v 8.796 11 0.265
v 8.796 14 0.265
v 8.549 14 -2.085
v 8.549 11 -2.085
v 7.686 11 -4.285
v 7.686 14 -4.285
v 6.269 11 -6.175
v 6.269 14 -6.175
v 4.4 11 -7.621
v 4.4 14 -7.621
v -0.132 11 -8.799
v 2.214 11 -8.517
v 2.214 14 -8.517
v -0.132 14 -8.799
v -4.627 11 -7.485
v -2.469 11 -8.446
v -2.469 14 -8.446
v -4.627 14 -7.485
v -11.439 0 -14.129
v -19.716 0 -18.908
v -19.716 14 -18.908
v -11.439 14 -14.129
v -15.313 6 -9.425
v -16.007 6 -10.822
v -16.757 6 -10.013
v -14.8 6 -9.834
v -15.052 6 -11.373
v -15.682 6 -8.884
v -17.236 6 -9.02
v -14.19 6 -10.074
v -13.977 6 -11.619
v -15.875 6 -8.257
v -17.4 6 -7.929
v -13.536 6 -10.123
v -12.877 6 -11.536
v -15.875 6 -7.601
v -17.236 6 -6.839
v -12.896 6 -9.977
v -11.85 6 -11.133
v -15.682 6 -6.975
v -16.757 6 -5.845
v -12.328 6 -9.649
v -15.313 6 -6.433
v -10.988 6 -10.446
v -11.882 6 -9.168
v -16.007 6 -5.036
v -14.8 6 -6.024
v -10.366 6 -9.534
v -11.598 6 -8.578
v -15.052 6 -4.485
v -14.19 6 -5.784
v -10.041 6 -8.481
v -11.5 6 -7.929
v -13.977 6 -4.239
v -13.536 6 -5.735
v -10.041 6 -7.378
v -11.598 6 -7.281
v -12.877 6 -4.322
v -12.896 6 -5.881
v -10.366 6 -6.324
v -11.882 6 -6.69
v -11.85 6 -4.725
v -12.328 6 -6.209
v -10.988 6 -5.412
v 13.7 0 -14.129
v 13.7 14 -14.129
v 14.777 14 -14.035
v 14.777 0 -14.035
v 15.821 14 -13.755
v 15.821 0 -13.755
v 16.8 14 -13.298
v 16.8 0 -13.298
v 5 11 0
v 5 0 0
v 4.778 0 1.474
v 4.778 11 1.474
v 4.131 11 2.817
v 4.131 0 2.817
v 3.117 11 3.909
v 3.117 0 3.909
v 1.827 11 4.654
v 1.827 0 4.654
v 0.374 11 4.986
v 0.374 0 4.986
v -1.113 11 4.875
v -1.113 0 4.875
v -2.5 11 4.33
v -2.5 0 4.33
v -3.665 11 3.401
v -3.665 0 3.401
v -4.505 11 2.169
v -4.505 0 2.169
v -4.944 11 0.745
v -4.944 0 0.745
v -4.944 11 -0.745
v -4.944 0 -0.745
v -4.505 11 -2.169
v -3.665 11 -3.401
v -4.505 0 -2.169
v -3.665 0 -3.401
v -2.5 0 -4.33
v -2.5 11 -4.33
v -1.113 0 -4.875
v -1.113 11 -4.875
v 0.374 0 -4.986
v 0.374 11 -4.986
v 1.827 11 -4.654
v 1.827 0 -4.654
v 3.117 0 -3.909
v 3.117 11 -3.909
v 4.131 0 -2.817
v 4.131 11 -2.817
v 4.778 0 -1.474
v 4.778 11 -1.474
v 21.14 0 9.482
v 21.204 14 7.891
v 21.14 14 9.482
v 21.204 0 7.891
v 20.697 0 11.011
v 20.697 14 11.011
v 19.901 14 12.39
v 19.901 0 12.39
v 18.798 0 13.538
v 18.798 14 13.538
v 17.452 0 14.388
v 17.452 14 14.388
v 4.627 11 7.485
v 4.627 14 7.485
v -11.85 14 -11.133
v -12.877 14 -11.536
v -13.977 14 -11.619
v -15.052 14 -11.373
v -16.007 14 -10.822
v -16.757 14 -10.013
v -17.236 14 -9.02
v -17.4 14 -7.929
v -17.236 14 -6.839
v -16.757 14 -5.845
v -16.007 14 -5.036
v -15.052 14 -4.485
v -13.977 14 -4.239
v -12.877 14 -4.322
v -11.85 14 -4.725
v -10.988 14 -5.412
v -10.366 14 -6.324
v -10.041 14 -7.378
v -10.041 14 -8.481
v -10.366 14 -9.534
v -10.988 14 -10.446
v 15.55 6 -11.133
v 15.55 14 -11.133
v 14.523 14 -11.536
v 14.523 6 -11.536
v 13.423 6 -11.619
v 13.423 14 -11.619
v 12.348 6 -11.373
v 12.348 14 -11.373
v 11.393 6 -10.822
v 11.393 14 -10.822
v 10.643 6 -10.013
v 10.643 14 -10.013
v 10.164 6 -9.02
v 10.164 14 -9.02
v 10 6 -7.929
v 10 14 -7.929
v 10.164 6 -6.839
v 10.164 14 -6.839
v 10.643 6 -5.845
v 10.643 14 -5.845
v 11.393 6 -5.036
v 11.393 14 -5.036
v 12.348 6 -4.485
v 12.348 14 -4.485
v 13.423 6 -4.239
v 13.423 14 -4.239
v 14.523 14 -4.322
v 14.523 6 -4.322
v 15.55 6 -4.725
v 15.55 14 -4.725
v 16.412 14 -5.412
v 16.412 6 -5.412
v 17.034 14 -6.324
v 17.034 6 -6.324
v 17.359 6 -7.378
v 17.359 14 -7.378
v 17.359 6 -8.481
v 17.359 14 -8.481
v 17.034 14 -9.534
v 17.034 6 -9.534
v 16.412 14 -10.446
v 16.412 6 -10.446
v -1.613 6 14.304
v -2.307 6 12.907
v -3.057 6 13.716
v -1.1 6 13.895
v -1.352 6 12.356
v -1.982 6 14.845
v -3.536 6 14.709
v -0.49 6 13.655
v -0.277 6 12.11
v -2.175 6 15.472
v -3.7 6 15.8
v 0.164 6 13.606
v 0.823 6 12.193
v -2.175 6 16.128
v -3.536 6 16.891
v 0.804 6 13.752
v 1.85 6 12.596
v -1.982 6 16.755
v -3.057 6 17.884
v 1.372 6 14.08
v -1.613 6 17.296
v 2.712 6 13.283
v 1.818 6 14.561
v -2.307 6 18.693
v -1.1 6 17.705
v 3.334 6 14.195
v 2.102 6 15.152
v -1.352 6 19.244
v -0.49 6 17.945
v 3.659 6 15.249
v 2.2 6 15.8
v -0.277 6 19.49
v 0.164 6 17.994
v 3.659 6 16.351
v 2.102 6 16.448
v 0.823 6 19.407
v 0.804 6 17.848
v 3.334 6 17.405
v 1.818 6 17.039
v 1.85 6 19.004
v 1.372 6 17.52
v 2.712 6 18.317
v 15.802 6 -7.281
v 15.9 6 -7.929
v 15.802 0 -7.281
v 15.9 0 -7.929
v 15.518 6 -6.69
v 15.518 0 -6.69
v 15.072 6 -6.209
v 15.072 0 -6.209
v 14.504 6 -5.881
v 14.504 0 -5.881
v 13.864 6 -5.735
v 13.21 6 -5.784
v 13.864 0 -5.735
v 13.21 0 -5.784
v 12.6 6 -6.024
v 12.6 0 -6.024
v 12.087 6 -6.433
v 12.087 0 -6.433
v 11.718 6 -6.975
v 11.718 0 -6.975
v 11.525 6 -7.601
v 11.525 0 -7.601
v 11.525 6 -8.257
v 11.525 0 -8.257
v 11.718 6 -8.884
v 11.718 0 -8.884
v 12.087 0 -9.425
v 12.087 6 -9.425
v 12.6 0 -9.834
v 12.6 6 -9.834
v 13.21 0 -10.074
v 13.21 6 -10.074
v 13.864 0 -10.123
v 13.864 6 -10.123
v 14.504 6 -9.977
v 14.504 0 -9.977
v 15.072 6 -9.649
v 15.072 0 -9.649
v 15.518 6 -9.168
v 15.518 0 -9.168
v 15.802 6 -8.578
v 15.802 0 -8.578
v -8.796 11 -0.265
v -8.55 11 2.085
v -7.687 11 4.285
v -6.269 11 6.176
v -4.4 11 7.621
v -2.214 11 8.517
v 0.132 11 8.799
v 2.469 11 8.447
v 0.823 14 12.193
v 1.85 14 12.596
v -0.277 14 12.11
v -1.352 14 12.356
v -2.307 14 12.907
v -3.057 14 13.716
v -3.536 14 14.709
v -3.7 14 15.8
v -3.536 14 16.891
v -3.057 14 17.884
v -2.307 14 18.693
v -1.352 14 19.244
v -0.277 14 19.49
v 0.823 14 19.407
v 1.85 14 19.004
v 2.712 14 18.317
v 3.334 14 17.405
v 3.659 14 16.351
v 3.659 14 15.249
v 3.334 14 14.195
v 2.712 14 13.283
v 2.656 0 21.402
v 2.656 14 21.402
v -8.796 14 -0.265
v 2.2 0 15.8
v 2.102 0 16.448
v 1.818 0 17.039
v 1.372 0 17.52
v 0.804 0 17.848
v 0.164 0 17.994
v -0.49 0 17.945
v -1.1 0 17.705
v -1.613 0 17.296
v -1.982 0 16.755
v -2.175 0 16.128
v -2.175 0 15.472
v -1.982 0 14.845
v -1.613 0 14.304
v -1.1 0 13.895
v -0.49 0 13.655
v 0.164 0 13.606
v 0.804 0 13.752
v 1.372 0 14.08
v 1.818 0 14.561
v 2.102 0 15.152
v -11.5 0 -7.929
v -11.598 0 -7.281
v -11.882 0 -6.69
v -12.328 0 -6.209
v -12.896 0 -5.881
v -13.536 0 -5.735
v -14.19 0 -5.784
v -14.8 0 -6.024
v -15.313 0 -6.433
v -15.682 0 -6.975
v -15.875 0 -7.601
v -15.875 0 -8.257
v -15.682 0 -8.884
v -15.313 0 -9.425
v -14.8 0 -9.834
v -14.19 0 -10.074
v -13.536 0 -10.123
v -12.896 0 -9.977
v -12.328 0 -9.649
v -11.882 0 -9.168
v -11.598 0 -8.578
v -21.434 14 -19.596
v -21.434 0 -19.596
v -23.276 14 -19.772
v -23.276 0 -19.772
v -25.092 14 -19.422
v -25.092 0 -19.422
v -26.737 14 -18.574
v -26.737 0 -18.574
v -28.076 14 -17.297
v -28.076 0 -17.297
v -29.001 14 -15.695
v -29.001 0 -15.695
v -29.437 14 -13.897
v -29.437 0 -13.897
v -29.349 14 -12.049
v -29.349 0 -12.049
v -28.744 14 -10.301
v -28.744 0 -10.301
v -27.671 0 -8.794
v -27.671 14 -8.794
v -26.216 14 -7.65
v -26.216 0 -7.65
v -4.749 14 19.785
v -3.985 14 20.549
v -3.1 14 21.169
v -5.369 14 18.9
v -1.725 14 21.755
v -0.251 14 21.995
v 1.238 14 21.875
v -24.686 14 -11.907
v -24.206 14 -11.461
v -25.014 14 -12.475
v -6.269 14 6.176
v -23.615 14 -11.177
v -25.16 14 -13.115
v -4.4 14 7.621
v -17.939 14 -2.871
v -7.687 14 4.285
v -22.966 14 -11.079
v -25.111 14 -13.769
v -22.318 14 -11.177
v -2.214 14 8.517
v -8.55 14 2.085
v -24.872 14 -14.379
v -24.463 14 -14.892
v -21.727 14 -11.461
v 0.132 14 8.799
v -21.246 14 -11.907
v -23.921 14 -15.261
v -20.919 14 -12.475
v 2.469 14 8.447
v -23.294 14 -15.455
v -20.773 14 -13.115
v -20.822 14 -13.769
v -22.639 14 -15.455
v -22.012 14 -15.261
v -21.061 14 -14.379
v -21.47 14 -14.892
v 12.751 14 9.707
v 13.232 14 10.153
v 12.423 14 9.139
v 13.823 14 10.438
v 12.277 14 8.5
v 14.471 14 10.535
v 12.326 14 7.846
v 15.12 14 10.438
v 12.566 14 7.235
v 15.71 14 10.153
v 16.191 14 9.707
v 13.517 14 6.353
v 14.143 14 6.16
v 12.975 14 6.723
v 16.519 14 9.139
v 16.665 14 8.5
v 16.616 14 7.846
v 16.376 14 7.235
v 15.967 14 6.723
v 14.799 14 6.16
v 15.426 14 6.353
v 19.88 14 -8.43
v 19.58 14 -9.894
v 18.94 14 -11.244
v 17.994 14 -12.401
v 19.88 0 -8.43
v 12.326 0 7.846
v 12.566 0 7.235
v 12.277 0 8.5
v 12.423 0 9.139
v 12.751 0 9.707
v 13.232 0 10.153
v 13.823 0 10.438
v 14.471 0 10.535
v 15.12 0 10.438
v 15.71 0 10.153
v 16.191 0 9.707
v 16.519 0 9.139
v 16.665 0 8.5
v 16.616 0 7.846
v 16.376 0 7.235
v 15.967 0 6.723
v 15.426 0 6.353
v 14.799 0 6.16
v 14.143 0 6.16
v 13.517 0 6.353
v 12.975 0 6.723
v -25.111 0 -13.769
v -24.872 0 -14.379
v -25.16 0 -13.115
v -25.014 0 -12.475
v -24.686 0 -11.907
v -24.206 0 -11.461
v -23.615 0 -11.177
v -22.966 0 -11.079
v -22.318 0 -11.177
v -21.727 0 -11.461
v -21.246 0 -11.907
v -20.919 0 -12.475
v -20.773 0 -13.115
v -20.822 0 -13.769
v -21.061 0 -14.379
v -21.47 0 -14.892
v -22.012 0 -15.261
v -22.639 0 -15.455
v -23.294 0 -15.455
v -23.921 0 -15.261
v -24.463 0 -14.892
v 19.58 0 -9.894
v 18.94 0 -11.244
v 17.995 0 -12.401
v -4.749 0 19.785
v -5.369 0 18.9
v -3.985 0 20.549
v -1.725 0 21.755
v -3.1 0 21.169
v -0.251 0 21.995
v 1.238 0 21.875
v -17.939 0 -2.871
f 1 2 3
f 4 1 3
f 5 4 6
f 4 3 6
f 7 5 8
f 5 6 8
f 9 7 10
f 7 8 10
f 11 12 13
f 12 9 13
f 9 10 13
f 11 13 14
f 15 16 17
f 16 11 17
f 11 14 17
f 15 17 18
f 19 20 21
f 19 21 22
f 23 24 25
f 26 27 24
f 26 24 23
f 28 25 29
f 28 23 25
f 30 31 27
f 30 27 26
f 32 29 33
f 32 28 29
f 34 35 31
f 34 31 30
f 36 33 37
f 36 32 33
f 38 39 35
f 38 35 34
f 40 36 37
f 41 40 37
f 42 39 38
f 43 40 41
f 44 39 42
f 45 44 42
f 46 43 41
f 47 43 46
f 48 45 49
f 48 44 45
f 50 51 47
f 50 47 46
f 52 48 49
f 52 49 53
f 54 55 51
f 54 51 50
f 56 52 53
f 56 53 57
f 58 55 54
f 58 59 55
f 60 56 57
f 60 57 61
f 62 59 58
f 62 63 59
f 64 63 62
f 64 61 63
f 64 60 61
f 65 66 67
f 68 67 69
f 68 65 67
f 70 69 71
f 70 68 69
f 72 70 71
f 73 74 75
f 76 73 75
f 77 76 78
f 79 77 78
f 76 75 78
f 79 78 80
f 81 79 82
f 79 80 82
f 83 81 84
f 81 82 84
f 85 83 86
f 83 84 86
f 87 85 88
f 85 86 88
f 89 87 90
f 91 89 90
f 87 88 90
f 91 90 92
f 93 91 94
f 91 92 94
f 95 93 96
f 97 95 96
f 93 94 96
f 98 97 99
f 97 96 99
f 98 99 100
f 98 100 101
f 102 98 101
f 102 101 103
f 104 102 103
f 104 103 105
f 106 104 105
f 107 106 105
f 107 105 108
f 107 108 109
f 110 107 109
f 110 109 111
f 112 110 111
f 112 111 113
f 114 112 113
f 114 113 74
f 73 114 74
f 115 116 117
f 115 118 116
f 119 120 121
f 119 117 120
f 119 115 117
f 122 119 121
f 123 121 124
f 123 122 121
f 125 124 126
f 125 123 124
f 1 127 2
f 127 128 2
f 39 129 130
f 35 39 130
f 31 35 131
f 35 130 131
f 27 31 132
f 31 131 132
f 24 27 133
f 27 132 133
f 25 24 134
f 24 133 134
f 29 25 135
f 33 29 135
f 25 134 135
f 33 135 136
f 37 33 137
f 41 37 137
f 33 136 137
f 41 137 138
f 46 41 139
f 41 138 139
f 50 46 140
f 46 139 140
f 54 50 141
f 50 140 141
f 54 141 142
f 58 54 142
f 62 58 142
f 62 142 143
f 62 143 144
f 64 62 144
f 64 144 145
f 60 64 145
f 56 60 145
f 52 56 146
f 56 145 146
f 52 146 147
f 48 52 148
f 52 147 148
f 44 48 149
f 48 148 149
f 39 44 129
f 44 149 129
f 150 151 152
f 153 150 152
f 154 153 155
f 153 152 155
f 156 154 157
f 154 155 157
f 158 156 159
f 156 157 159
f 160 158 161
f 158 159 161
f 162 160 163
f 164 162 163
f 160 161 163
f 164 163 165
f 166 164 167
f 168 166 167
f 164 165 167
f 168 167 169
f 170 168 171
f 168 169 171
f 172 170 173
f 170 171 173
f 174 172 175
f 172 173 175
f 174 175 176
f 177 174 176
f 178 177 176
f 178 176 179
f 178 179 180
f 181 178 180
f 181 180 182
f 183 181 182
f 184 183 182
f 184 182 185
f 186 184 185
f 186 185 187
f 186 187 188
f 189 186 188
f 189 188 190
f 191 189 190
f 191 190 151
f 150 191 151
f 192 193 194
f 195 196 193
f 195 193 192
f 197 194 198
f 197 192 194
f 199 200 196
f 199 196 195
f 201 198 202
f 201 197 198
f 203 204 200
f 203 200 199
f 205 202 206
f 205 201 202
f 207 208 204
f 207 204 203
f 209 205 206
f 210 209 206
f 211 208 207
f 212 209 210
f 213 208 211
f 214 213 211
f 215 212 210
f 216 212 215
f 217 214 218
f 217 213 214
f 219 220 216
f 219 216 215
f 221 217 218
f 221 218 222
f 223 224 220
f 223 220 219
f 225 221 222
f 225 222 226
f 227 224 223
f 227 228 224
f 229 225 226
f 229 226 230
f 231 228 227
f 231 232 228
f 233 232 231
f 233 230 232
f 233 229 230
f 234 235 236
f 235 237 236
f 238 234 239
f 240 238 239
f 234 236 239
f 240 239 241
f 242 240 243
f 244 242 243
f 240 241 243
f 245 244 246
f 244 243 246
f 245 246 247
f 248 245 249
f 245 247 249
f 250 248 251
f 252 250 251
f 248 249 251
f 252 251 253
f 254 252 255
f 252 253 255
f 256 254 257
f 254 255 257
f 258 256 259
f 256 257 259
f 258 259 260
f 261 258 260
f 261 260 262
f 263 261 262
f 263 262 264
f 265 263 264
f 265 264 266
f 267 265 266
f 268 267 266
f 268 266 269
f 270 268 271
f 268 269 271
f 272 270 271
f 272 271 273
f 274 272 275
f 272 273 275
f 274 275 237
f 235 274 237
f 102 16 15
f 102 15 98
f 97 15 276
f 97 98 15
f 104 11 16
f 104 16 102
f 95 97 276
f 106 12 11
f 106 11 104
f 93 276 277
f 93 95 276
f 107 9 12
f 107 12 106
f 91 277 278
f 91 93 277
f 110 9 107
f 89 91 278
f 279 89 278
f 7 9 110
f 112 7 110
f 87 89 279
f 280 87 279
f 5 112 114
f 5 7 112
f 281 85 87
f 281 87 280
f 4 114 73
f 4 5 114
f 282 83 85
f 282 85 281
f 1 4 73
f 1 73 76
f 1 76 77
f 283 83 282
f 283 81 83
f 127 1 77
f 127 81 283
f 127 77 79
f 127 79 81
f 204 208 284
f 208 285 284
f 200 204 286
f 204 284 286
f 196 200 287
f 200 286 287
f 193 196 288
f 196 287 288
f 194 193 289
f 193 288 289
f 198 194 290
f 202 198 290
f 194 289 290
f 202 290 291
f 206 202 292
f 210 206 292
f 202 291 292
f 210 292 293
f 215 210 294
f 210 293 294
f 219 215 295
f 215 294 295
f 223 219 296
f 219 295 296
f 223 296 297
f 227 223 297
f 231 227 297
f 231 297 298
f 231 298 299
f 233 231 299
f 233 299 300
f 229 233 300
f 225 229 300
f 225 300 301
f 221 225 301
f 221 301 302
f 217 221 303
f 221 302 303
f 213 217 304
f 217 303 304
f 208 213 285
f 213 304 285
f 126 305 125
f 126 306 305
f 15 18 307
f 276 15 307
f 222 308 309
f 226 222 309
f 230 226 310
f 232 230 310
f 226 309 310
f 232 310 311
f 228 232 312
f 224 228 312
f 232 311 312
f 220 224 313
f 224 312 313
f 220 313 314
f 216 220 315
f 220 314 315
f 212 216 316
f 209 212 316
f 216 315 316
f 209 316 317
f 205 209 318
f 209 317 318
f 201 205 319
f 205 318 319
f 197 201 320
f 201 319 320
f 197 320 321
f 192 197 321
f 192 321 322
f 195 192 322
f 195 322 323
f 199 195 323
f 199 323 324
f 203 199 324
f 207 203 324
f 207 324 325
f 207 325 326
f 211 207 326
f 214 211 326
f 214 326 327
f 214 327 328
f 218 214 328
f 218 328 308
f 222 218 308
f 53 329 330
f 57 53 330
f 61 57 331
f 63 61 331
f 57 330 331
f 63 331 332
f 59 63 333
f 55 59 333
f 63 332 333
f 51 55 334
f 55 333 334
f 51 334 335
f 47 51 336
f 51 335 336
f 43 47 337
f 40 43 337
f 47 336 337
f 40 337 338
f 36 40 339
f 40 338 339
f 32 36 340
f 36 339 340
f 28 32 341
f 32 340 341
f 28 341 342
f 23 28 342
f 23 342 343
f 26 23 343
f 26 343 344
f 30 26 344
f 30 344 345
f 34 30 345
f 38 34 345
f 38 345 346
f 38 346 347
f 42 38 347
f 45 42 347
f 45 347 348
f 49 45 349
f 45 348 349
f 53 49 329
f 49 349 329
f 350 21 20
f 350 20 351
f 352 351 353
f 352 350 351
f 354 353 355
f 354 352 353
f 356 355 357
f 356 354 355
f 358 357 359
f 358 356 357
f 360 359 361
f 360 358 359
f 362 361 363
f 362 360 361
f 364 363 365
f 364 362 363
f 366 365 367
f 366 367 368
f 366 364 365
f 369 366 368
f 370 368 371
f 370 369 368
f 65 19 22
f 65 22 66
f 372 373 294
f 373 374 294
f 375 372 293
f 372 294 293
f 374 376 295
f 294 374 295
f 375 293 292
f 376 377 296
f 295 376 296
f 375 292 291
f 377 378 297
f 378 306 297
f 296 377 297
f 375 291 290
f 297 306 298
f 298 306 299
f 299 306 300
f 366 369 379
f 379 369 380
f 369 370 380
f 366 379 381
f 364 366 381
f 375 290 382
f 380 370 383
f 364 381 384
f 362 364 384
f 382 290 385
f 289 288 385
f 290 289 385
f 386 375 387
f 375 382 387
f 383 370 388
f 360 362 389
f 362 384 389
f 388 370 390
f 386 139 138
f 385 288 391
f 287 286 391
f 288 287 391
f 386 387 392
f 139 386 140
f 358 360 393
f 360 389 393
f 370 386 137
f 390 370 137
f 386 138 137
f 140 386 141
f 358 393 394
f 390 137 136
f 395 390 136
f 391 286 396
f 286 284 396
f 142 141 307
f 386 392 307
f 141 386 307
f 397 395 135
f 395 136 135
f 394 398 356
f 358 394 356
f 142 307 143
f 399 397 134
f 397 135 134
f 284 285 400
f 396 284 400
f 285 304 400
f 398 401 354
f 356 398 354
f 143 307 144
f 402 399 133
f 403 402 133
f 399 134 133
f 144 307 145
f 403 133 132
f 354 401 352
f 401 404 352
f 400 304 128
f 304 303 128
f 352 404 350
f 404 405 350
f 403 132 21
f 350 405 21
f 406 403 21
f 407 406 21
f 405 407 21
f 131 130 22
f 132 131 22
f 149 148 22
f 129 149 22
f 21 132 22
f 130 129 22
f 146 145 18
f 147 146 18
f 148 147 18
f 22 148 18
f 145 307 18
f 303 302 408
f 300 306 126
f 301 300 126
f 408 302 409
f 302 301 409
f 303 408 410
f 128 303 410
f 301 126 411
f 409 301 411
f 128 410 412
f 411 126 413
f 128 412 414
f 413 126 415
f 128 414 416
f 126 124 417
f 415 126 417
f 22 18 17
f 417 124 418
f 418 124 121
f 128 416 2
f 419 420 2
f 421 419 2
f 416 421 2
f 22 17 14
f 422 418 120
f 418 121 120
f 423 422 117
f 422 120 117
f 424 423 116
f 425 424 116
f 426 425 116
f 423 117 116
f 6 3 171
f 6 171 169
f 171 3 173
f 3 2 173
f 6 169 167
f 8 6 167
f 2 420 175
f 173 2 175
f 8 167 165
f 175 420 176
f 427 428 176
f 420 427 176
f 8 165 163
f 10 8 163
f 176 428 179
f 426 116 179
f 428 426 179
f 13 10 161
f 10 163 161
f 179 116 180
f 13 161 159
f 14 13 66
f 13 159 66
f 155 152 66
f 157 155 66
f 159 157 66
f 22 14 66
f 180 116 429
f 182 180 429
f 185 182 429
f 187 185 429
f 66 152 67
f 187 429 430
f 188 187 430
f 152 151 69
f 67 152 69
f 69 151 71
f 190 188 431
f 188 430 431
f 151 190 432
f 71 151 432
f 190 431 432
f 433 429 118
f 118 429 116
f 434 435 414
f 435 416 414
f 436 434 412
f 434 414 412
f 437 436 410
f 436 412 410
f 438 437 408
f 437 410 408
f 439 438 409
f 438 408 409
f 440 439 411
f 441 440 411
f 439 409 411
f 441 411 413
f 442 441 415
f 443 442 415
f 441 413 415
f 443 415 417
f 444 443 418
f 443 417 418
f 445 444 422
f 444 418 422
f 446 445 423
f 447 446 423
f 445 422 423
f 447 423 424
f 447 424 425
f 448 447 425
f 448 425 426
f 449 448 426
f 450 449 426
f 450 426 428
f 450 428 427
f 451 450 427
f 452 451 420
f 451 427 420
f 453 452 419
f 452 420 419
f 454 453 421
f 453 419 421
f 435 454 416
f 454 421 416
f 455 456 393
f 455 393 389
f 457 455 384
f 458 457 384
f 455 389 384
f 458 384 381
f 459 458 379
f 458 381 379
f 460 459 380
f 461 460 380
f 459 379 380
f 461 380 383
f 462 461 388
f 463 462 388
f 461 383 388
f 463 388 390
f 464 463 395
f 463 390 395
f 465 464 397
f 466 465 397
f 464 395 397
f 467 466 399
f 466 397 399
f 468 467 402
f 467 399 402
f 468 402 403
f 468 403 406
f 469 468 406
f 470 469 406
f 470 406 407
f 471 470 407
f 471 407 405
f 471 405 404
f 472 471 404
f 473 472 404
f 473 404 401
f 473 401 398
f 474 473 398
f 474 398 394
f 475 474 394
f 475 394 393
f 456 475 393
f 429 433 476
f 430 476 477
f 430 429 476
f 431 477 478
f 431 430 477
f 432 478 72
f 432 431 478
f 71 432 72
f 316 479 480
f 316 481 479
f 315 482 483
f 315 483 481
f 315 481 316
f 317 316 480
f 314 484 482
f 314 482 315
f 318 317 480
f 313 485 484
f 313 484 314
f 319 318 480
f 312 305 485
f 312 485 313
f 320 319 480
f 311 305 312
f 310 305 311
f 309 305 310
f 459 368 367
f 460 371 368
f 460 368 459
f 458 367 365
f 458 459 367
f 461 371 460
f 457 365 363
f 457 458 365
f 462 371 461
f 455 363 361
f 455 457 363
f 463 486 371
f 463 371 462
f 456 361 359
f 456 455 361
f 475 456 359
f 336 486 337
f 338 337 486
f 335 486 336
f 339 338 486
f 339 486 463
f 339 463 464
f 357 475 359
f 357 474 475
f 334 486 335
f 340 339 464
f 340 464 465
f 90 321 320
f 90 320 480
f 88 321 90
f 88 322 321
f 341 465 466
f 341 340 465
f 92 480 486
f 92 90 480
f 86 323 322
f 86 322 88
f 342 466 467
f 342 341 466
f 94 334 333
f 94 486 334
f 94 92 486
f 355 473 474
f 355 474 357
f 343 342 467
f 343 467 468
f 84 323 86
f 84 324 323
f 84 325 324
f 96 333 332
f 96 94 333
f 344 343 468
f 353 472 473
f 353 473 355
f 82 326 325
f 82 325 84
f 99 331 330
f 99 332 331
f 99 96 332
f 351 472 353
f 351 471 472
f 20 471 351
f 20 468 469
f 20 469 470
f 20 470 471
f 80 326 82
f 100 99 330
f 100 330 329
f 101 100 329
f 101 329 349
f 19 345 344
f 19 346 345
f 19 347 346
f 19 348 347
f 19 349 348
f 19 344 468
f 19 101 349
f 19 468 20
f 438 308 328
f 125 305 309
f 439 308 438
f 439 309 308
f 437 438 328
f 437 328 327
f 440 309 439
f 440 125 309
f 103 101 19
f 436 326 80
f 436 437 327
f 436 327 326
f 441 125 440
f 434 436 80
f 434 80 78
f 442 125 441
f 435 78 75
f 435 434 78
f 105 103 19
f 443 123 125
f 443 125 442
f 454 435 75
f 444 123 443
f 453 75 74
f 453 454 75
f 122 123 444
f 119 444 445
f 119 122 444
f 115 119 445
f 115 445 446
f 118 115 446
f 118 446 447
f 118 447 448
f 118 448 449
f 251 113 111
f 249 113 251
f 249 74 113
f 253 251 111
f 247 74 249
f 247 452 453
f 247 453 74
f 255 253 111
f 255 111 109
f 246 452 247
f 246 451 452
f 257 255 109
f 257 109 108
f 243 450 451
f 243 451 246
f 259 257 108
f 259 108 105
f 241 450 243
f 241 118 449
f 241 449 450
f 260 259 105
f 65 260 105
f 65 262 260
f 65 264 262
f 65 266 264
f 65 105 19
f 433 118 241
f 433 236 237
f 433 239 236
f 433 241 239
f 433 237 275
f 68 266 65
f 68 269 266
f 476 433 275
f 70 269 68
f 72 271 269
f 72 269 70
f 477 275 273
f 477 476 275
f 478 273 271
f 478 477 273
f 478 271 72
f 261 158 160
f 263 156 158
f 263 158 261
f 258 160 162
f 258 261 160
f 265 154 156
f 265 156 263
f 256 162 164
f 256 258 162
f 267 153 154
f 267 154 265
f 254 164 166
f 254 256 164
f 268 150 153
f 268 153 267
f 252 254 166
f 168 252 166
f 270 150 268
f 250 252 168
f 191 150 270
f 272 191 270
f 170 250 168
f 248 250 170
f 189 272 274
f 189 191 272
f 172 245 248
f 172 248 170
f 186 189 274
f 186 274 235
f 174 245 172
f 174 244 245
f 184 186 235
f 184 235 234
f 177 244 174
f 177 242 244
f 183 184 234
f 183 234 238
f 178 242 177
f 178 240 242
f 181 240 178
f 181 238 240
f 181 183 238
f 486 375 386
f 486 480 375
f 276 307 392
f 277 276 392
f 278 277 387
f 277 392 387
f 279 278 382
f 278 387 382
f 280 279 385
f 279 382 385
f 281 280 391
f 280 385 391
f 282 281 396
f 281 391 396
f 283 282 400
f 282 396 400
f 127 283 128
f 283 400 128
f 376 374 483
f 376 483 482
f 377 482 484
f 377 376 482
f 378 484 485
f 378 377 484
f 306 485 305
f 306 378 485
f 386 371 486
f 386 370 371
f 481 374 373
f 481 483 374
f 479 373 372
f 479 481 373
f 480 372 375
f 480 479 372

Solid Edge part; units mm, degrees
sketch "Sketch1" plane through (0, 0, 0) normal (0, -1, 0) x (1, 0, 0)
  line L0 (-5.3694, 18.9) -> (-19.0694, -4.8291)
  arc A0 (-13.7, -14.1291) -> (-19.0694, -4.8291) centre (-13.7, -7.9291) cw
  line L1 (-13.7, -14.1291) -> (13.7, -14.1291)
  arc A1 (19.0694, -4.8291) -> (13.7, -14.1291) centre (13.7, -7.9291) cw
  line L2 (5.3694, 18.9) -> (19.0694, -4.8291)
  arc A2 (-5.3694, 18.9) -> (5.3694, 18.9) centre (0, 15.8) cw
  dimension "D1" = 5.3694
extrude "Protrusion1" add sketch "Sketch1" against normal blind 14
sketch "Sketch2" plane through (0, 0, 0) normal (0, -1, 0) x (1, 0, 0)
  circle A0 centre (-13.7, -7.9291) radius 2.2
  circle A1 centre (13.7, -7.9291) radius 2.2
  circle A2 centre (0, 15.8) radius 2.2
  dimension "D1" = 20
  dimension "D2" = 4
  dimension "D3" = 4.4
  dimension "D4" = 6.2
  dimension "D5" = 6.2
  dimension "D6" = 4.4
  dimension "D7" = 6.2
  dimension "D8" = 27.4
  dimension "D9" = 27.4
  dimension "D10" = 27.4
extrude "Cutout1" cut sketch "Sketch2" against normal blind 457.8755
sketch "Sketch3" plane through (0, 0, 0) normal (0, -1, 0) x (1, 0, 0)
  circle A0 centre (0, 0) radius 5
extrude "Cutout2" cut sketch "Sketch3" against normal blind 434.4917
sketch "Sketch4" plane through (0, 0, 3.9355) normal (0, -1, 0) x (-0.5, 0, 0.8660254)
  line L0 (-23.325, -5.9323) -> (-23.325, -18.9323)
  line L1 (-23.325, -18.9323) -> (16.475, -18.9323)
  line L2 (16.475, -18.9323) -> (16.475, -5.9323)
  line L3 (12.7755, -8.7037) -> (16.475, -5.9323)
  line L4 (-20.9306, -8.7037) -> (12.7755, -8.7037)
  line L5 (-20.9306, -5.9323) -> (-20.9306, -8.7037)
  line L6 (-23.325, -5.9323) -> (-20.9306, -5.9323)
  dimension "D1" = 13
extrude "Protrusion2" add sketch "Sketch4" against normal up to vertex (14 mm away)
sketch "Sketch5" plane through (18.1083, 8, 10.4355) normal (0.8660254, 0, 0.5) x (-0.5, 0, 0.8660254)
  line L0 (-19.9, 8) -> (19.9, 8)
  line L1 (19.9, -6) -> (19.9, 8)
  line L2 (-19.9, -6) -> (19.9, -6)
  line L3 (-19.9, -6) -> (-19.9, 8)
extrude "ExtrudedProtrusion_14" add sketch "Sketch5" along normal blind 4
sketch "Sketch6" plane through (5.8112, 14, 7.7701) normal (0, 1, 0) x (0.5, 0, -0.8660254)
  circle A0 centre (3.8403, 24.7468) radius 3.7
  circle A1 centre (17.5403, 1.0177) radius 3.7
  circle A2 centre (-9.8597, 1.0177) radius 3.7
extrude "Cutout3" cut sketch "Sketch6" against normal blind 8
sketch "Sketch7" plane through (11.8615, 14, 7.7701) normal (0, 1, 0) x (-0.8660254, 0, -0.5)
  circle A0 centre (-2.5426, -0.8152) radius 2.2
  dimension "D1" = 6
  dimension "D2" = 19.9
  dimension "D3" = 4.4
extrude "ExtrudedCutout_23" cut sketch "Sketch7" against normal blind 166.5817
sketch "Sketch8" plane through (11.8615, 14, 7.7701) normal (0, 1, 0) x (-0.8660254, 0, -0.5)
  circle A0 centre (40.6865, -0.8152) radius 2.2
  line L0 (40.6865, 5.6848) -> (31.1282, 5.6848)
  line L1 (31.1282, 5.6848) -> (31.1282, 3.8832)
  line L2 (31.1282, 3.8832) -> (34.2429, 1.8592)
  line L3 (34.2429, 1.8592) -> (34.2429, -2.6486)
  line L4 (31.1282, -7.3152) -> (34.2429, -2.6486)
  line L5 (40.6865, -7.3152) -> (31.1282, -7.3152)
  arc A1 (40.6865, -7.3152) -> (40.6865, 5.6848) centre (40.6865, -0.8152) ccw
extrude "Protrusion3" add sketch "Sketch8" against normal up to vertex (14 mm away)
sketch "Sketch9" plane through (11.8615, 14, 7.7701) normal (0, 1, 0) x (-0.8660254, 0, -0.5)
  line L0 (-10.7426, -0.8152) -> (-10.7426, -20.7152)
  line L1 (-10.7426, -20.7152) -> (6.2574, -20.7152)
  arc A0 (1.1563, -18.0392) -> (6.2574, -20.7152) centre (6.2574, -14.5152) ccw
  line L2 (1.1563, -18.0392) -> (-10.7426, -0.8152)
extrude "Cutout4" cut sketch "Sketch9" against normal blind 85.4791
sketch "Sketch10" plane through (6.8865, 14, 7.7701) normal (0, 1, 0) x (-0.8660254, 0, -0.5)
  line L0 (-15.0511, 16.5973) -> (-15.0511, -3.3027)
  line L1 (-3.1522, 13.9213) -> (-15.0511, -3.3027)
  arc A0 (1.9489, 16.5973) -> (-3.1522, 13.9213) centre (1.9489, 10.3973) ccw
  line L2 (1.9489, 16.5973) -> (-15.0511, 16.5973)
extrude "ExtrudedCutout_27" cut sketch "Sketch10" against normal blind 118.3722
fillet "Round_1" radius 6.6 1 edges at (21.5724, 7, 12.4355)
sketch "Sketch11" plane through (-4.1206, 14, 1.1105) normal (0, 1, 0) x (0.0808589, 0, 0.9967256)
  line L0 (7.0612, 8.2038) -> (0.2016, 12.9426)
  arc A0 (-8.6084, 0.1899) -> (0.2016, 12.9426) centre (-0.7736, 4.1968) cw
  line L1 (-8.6084, 0.1899) -> (-1.7489, -4.5489)
  arc A1 (-1.7489, -4.5489) -> (7.0612, 8.2038) centre (-0.7736, 4.1968) ccw
extrude "ExtrudedCutout_28" cut sketch "Sketch11" against normal blind 3
